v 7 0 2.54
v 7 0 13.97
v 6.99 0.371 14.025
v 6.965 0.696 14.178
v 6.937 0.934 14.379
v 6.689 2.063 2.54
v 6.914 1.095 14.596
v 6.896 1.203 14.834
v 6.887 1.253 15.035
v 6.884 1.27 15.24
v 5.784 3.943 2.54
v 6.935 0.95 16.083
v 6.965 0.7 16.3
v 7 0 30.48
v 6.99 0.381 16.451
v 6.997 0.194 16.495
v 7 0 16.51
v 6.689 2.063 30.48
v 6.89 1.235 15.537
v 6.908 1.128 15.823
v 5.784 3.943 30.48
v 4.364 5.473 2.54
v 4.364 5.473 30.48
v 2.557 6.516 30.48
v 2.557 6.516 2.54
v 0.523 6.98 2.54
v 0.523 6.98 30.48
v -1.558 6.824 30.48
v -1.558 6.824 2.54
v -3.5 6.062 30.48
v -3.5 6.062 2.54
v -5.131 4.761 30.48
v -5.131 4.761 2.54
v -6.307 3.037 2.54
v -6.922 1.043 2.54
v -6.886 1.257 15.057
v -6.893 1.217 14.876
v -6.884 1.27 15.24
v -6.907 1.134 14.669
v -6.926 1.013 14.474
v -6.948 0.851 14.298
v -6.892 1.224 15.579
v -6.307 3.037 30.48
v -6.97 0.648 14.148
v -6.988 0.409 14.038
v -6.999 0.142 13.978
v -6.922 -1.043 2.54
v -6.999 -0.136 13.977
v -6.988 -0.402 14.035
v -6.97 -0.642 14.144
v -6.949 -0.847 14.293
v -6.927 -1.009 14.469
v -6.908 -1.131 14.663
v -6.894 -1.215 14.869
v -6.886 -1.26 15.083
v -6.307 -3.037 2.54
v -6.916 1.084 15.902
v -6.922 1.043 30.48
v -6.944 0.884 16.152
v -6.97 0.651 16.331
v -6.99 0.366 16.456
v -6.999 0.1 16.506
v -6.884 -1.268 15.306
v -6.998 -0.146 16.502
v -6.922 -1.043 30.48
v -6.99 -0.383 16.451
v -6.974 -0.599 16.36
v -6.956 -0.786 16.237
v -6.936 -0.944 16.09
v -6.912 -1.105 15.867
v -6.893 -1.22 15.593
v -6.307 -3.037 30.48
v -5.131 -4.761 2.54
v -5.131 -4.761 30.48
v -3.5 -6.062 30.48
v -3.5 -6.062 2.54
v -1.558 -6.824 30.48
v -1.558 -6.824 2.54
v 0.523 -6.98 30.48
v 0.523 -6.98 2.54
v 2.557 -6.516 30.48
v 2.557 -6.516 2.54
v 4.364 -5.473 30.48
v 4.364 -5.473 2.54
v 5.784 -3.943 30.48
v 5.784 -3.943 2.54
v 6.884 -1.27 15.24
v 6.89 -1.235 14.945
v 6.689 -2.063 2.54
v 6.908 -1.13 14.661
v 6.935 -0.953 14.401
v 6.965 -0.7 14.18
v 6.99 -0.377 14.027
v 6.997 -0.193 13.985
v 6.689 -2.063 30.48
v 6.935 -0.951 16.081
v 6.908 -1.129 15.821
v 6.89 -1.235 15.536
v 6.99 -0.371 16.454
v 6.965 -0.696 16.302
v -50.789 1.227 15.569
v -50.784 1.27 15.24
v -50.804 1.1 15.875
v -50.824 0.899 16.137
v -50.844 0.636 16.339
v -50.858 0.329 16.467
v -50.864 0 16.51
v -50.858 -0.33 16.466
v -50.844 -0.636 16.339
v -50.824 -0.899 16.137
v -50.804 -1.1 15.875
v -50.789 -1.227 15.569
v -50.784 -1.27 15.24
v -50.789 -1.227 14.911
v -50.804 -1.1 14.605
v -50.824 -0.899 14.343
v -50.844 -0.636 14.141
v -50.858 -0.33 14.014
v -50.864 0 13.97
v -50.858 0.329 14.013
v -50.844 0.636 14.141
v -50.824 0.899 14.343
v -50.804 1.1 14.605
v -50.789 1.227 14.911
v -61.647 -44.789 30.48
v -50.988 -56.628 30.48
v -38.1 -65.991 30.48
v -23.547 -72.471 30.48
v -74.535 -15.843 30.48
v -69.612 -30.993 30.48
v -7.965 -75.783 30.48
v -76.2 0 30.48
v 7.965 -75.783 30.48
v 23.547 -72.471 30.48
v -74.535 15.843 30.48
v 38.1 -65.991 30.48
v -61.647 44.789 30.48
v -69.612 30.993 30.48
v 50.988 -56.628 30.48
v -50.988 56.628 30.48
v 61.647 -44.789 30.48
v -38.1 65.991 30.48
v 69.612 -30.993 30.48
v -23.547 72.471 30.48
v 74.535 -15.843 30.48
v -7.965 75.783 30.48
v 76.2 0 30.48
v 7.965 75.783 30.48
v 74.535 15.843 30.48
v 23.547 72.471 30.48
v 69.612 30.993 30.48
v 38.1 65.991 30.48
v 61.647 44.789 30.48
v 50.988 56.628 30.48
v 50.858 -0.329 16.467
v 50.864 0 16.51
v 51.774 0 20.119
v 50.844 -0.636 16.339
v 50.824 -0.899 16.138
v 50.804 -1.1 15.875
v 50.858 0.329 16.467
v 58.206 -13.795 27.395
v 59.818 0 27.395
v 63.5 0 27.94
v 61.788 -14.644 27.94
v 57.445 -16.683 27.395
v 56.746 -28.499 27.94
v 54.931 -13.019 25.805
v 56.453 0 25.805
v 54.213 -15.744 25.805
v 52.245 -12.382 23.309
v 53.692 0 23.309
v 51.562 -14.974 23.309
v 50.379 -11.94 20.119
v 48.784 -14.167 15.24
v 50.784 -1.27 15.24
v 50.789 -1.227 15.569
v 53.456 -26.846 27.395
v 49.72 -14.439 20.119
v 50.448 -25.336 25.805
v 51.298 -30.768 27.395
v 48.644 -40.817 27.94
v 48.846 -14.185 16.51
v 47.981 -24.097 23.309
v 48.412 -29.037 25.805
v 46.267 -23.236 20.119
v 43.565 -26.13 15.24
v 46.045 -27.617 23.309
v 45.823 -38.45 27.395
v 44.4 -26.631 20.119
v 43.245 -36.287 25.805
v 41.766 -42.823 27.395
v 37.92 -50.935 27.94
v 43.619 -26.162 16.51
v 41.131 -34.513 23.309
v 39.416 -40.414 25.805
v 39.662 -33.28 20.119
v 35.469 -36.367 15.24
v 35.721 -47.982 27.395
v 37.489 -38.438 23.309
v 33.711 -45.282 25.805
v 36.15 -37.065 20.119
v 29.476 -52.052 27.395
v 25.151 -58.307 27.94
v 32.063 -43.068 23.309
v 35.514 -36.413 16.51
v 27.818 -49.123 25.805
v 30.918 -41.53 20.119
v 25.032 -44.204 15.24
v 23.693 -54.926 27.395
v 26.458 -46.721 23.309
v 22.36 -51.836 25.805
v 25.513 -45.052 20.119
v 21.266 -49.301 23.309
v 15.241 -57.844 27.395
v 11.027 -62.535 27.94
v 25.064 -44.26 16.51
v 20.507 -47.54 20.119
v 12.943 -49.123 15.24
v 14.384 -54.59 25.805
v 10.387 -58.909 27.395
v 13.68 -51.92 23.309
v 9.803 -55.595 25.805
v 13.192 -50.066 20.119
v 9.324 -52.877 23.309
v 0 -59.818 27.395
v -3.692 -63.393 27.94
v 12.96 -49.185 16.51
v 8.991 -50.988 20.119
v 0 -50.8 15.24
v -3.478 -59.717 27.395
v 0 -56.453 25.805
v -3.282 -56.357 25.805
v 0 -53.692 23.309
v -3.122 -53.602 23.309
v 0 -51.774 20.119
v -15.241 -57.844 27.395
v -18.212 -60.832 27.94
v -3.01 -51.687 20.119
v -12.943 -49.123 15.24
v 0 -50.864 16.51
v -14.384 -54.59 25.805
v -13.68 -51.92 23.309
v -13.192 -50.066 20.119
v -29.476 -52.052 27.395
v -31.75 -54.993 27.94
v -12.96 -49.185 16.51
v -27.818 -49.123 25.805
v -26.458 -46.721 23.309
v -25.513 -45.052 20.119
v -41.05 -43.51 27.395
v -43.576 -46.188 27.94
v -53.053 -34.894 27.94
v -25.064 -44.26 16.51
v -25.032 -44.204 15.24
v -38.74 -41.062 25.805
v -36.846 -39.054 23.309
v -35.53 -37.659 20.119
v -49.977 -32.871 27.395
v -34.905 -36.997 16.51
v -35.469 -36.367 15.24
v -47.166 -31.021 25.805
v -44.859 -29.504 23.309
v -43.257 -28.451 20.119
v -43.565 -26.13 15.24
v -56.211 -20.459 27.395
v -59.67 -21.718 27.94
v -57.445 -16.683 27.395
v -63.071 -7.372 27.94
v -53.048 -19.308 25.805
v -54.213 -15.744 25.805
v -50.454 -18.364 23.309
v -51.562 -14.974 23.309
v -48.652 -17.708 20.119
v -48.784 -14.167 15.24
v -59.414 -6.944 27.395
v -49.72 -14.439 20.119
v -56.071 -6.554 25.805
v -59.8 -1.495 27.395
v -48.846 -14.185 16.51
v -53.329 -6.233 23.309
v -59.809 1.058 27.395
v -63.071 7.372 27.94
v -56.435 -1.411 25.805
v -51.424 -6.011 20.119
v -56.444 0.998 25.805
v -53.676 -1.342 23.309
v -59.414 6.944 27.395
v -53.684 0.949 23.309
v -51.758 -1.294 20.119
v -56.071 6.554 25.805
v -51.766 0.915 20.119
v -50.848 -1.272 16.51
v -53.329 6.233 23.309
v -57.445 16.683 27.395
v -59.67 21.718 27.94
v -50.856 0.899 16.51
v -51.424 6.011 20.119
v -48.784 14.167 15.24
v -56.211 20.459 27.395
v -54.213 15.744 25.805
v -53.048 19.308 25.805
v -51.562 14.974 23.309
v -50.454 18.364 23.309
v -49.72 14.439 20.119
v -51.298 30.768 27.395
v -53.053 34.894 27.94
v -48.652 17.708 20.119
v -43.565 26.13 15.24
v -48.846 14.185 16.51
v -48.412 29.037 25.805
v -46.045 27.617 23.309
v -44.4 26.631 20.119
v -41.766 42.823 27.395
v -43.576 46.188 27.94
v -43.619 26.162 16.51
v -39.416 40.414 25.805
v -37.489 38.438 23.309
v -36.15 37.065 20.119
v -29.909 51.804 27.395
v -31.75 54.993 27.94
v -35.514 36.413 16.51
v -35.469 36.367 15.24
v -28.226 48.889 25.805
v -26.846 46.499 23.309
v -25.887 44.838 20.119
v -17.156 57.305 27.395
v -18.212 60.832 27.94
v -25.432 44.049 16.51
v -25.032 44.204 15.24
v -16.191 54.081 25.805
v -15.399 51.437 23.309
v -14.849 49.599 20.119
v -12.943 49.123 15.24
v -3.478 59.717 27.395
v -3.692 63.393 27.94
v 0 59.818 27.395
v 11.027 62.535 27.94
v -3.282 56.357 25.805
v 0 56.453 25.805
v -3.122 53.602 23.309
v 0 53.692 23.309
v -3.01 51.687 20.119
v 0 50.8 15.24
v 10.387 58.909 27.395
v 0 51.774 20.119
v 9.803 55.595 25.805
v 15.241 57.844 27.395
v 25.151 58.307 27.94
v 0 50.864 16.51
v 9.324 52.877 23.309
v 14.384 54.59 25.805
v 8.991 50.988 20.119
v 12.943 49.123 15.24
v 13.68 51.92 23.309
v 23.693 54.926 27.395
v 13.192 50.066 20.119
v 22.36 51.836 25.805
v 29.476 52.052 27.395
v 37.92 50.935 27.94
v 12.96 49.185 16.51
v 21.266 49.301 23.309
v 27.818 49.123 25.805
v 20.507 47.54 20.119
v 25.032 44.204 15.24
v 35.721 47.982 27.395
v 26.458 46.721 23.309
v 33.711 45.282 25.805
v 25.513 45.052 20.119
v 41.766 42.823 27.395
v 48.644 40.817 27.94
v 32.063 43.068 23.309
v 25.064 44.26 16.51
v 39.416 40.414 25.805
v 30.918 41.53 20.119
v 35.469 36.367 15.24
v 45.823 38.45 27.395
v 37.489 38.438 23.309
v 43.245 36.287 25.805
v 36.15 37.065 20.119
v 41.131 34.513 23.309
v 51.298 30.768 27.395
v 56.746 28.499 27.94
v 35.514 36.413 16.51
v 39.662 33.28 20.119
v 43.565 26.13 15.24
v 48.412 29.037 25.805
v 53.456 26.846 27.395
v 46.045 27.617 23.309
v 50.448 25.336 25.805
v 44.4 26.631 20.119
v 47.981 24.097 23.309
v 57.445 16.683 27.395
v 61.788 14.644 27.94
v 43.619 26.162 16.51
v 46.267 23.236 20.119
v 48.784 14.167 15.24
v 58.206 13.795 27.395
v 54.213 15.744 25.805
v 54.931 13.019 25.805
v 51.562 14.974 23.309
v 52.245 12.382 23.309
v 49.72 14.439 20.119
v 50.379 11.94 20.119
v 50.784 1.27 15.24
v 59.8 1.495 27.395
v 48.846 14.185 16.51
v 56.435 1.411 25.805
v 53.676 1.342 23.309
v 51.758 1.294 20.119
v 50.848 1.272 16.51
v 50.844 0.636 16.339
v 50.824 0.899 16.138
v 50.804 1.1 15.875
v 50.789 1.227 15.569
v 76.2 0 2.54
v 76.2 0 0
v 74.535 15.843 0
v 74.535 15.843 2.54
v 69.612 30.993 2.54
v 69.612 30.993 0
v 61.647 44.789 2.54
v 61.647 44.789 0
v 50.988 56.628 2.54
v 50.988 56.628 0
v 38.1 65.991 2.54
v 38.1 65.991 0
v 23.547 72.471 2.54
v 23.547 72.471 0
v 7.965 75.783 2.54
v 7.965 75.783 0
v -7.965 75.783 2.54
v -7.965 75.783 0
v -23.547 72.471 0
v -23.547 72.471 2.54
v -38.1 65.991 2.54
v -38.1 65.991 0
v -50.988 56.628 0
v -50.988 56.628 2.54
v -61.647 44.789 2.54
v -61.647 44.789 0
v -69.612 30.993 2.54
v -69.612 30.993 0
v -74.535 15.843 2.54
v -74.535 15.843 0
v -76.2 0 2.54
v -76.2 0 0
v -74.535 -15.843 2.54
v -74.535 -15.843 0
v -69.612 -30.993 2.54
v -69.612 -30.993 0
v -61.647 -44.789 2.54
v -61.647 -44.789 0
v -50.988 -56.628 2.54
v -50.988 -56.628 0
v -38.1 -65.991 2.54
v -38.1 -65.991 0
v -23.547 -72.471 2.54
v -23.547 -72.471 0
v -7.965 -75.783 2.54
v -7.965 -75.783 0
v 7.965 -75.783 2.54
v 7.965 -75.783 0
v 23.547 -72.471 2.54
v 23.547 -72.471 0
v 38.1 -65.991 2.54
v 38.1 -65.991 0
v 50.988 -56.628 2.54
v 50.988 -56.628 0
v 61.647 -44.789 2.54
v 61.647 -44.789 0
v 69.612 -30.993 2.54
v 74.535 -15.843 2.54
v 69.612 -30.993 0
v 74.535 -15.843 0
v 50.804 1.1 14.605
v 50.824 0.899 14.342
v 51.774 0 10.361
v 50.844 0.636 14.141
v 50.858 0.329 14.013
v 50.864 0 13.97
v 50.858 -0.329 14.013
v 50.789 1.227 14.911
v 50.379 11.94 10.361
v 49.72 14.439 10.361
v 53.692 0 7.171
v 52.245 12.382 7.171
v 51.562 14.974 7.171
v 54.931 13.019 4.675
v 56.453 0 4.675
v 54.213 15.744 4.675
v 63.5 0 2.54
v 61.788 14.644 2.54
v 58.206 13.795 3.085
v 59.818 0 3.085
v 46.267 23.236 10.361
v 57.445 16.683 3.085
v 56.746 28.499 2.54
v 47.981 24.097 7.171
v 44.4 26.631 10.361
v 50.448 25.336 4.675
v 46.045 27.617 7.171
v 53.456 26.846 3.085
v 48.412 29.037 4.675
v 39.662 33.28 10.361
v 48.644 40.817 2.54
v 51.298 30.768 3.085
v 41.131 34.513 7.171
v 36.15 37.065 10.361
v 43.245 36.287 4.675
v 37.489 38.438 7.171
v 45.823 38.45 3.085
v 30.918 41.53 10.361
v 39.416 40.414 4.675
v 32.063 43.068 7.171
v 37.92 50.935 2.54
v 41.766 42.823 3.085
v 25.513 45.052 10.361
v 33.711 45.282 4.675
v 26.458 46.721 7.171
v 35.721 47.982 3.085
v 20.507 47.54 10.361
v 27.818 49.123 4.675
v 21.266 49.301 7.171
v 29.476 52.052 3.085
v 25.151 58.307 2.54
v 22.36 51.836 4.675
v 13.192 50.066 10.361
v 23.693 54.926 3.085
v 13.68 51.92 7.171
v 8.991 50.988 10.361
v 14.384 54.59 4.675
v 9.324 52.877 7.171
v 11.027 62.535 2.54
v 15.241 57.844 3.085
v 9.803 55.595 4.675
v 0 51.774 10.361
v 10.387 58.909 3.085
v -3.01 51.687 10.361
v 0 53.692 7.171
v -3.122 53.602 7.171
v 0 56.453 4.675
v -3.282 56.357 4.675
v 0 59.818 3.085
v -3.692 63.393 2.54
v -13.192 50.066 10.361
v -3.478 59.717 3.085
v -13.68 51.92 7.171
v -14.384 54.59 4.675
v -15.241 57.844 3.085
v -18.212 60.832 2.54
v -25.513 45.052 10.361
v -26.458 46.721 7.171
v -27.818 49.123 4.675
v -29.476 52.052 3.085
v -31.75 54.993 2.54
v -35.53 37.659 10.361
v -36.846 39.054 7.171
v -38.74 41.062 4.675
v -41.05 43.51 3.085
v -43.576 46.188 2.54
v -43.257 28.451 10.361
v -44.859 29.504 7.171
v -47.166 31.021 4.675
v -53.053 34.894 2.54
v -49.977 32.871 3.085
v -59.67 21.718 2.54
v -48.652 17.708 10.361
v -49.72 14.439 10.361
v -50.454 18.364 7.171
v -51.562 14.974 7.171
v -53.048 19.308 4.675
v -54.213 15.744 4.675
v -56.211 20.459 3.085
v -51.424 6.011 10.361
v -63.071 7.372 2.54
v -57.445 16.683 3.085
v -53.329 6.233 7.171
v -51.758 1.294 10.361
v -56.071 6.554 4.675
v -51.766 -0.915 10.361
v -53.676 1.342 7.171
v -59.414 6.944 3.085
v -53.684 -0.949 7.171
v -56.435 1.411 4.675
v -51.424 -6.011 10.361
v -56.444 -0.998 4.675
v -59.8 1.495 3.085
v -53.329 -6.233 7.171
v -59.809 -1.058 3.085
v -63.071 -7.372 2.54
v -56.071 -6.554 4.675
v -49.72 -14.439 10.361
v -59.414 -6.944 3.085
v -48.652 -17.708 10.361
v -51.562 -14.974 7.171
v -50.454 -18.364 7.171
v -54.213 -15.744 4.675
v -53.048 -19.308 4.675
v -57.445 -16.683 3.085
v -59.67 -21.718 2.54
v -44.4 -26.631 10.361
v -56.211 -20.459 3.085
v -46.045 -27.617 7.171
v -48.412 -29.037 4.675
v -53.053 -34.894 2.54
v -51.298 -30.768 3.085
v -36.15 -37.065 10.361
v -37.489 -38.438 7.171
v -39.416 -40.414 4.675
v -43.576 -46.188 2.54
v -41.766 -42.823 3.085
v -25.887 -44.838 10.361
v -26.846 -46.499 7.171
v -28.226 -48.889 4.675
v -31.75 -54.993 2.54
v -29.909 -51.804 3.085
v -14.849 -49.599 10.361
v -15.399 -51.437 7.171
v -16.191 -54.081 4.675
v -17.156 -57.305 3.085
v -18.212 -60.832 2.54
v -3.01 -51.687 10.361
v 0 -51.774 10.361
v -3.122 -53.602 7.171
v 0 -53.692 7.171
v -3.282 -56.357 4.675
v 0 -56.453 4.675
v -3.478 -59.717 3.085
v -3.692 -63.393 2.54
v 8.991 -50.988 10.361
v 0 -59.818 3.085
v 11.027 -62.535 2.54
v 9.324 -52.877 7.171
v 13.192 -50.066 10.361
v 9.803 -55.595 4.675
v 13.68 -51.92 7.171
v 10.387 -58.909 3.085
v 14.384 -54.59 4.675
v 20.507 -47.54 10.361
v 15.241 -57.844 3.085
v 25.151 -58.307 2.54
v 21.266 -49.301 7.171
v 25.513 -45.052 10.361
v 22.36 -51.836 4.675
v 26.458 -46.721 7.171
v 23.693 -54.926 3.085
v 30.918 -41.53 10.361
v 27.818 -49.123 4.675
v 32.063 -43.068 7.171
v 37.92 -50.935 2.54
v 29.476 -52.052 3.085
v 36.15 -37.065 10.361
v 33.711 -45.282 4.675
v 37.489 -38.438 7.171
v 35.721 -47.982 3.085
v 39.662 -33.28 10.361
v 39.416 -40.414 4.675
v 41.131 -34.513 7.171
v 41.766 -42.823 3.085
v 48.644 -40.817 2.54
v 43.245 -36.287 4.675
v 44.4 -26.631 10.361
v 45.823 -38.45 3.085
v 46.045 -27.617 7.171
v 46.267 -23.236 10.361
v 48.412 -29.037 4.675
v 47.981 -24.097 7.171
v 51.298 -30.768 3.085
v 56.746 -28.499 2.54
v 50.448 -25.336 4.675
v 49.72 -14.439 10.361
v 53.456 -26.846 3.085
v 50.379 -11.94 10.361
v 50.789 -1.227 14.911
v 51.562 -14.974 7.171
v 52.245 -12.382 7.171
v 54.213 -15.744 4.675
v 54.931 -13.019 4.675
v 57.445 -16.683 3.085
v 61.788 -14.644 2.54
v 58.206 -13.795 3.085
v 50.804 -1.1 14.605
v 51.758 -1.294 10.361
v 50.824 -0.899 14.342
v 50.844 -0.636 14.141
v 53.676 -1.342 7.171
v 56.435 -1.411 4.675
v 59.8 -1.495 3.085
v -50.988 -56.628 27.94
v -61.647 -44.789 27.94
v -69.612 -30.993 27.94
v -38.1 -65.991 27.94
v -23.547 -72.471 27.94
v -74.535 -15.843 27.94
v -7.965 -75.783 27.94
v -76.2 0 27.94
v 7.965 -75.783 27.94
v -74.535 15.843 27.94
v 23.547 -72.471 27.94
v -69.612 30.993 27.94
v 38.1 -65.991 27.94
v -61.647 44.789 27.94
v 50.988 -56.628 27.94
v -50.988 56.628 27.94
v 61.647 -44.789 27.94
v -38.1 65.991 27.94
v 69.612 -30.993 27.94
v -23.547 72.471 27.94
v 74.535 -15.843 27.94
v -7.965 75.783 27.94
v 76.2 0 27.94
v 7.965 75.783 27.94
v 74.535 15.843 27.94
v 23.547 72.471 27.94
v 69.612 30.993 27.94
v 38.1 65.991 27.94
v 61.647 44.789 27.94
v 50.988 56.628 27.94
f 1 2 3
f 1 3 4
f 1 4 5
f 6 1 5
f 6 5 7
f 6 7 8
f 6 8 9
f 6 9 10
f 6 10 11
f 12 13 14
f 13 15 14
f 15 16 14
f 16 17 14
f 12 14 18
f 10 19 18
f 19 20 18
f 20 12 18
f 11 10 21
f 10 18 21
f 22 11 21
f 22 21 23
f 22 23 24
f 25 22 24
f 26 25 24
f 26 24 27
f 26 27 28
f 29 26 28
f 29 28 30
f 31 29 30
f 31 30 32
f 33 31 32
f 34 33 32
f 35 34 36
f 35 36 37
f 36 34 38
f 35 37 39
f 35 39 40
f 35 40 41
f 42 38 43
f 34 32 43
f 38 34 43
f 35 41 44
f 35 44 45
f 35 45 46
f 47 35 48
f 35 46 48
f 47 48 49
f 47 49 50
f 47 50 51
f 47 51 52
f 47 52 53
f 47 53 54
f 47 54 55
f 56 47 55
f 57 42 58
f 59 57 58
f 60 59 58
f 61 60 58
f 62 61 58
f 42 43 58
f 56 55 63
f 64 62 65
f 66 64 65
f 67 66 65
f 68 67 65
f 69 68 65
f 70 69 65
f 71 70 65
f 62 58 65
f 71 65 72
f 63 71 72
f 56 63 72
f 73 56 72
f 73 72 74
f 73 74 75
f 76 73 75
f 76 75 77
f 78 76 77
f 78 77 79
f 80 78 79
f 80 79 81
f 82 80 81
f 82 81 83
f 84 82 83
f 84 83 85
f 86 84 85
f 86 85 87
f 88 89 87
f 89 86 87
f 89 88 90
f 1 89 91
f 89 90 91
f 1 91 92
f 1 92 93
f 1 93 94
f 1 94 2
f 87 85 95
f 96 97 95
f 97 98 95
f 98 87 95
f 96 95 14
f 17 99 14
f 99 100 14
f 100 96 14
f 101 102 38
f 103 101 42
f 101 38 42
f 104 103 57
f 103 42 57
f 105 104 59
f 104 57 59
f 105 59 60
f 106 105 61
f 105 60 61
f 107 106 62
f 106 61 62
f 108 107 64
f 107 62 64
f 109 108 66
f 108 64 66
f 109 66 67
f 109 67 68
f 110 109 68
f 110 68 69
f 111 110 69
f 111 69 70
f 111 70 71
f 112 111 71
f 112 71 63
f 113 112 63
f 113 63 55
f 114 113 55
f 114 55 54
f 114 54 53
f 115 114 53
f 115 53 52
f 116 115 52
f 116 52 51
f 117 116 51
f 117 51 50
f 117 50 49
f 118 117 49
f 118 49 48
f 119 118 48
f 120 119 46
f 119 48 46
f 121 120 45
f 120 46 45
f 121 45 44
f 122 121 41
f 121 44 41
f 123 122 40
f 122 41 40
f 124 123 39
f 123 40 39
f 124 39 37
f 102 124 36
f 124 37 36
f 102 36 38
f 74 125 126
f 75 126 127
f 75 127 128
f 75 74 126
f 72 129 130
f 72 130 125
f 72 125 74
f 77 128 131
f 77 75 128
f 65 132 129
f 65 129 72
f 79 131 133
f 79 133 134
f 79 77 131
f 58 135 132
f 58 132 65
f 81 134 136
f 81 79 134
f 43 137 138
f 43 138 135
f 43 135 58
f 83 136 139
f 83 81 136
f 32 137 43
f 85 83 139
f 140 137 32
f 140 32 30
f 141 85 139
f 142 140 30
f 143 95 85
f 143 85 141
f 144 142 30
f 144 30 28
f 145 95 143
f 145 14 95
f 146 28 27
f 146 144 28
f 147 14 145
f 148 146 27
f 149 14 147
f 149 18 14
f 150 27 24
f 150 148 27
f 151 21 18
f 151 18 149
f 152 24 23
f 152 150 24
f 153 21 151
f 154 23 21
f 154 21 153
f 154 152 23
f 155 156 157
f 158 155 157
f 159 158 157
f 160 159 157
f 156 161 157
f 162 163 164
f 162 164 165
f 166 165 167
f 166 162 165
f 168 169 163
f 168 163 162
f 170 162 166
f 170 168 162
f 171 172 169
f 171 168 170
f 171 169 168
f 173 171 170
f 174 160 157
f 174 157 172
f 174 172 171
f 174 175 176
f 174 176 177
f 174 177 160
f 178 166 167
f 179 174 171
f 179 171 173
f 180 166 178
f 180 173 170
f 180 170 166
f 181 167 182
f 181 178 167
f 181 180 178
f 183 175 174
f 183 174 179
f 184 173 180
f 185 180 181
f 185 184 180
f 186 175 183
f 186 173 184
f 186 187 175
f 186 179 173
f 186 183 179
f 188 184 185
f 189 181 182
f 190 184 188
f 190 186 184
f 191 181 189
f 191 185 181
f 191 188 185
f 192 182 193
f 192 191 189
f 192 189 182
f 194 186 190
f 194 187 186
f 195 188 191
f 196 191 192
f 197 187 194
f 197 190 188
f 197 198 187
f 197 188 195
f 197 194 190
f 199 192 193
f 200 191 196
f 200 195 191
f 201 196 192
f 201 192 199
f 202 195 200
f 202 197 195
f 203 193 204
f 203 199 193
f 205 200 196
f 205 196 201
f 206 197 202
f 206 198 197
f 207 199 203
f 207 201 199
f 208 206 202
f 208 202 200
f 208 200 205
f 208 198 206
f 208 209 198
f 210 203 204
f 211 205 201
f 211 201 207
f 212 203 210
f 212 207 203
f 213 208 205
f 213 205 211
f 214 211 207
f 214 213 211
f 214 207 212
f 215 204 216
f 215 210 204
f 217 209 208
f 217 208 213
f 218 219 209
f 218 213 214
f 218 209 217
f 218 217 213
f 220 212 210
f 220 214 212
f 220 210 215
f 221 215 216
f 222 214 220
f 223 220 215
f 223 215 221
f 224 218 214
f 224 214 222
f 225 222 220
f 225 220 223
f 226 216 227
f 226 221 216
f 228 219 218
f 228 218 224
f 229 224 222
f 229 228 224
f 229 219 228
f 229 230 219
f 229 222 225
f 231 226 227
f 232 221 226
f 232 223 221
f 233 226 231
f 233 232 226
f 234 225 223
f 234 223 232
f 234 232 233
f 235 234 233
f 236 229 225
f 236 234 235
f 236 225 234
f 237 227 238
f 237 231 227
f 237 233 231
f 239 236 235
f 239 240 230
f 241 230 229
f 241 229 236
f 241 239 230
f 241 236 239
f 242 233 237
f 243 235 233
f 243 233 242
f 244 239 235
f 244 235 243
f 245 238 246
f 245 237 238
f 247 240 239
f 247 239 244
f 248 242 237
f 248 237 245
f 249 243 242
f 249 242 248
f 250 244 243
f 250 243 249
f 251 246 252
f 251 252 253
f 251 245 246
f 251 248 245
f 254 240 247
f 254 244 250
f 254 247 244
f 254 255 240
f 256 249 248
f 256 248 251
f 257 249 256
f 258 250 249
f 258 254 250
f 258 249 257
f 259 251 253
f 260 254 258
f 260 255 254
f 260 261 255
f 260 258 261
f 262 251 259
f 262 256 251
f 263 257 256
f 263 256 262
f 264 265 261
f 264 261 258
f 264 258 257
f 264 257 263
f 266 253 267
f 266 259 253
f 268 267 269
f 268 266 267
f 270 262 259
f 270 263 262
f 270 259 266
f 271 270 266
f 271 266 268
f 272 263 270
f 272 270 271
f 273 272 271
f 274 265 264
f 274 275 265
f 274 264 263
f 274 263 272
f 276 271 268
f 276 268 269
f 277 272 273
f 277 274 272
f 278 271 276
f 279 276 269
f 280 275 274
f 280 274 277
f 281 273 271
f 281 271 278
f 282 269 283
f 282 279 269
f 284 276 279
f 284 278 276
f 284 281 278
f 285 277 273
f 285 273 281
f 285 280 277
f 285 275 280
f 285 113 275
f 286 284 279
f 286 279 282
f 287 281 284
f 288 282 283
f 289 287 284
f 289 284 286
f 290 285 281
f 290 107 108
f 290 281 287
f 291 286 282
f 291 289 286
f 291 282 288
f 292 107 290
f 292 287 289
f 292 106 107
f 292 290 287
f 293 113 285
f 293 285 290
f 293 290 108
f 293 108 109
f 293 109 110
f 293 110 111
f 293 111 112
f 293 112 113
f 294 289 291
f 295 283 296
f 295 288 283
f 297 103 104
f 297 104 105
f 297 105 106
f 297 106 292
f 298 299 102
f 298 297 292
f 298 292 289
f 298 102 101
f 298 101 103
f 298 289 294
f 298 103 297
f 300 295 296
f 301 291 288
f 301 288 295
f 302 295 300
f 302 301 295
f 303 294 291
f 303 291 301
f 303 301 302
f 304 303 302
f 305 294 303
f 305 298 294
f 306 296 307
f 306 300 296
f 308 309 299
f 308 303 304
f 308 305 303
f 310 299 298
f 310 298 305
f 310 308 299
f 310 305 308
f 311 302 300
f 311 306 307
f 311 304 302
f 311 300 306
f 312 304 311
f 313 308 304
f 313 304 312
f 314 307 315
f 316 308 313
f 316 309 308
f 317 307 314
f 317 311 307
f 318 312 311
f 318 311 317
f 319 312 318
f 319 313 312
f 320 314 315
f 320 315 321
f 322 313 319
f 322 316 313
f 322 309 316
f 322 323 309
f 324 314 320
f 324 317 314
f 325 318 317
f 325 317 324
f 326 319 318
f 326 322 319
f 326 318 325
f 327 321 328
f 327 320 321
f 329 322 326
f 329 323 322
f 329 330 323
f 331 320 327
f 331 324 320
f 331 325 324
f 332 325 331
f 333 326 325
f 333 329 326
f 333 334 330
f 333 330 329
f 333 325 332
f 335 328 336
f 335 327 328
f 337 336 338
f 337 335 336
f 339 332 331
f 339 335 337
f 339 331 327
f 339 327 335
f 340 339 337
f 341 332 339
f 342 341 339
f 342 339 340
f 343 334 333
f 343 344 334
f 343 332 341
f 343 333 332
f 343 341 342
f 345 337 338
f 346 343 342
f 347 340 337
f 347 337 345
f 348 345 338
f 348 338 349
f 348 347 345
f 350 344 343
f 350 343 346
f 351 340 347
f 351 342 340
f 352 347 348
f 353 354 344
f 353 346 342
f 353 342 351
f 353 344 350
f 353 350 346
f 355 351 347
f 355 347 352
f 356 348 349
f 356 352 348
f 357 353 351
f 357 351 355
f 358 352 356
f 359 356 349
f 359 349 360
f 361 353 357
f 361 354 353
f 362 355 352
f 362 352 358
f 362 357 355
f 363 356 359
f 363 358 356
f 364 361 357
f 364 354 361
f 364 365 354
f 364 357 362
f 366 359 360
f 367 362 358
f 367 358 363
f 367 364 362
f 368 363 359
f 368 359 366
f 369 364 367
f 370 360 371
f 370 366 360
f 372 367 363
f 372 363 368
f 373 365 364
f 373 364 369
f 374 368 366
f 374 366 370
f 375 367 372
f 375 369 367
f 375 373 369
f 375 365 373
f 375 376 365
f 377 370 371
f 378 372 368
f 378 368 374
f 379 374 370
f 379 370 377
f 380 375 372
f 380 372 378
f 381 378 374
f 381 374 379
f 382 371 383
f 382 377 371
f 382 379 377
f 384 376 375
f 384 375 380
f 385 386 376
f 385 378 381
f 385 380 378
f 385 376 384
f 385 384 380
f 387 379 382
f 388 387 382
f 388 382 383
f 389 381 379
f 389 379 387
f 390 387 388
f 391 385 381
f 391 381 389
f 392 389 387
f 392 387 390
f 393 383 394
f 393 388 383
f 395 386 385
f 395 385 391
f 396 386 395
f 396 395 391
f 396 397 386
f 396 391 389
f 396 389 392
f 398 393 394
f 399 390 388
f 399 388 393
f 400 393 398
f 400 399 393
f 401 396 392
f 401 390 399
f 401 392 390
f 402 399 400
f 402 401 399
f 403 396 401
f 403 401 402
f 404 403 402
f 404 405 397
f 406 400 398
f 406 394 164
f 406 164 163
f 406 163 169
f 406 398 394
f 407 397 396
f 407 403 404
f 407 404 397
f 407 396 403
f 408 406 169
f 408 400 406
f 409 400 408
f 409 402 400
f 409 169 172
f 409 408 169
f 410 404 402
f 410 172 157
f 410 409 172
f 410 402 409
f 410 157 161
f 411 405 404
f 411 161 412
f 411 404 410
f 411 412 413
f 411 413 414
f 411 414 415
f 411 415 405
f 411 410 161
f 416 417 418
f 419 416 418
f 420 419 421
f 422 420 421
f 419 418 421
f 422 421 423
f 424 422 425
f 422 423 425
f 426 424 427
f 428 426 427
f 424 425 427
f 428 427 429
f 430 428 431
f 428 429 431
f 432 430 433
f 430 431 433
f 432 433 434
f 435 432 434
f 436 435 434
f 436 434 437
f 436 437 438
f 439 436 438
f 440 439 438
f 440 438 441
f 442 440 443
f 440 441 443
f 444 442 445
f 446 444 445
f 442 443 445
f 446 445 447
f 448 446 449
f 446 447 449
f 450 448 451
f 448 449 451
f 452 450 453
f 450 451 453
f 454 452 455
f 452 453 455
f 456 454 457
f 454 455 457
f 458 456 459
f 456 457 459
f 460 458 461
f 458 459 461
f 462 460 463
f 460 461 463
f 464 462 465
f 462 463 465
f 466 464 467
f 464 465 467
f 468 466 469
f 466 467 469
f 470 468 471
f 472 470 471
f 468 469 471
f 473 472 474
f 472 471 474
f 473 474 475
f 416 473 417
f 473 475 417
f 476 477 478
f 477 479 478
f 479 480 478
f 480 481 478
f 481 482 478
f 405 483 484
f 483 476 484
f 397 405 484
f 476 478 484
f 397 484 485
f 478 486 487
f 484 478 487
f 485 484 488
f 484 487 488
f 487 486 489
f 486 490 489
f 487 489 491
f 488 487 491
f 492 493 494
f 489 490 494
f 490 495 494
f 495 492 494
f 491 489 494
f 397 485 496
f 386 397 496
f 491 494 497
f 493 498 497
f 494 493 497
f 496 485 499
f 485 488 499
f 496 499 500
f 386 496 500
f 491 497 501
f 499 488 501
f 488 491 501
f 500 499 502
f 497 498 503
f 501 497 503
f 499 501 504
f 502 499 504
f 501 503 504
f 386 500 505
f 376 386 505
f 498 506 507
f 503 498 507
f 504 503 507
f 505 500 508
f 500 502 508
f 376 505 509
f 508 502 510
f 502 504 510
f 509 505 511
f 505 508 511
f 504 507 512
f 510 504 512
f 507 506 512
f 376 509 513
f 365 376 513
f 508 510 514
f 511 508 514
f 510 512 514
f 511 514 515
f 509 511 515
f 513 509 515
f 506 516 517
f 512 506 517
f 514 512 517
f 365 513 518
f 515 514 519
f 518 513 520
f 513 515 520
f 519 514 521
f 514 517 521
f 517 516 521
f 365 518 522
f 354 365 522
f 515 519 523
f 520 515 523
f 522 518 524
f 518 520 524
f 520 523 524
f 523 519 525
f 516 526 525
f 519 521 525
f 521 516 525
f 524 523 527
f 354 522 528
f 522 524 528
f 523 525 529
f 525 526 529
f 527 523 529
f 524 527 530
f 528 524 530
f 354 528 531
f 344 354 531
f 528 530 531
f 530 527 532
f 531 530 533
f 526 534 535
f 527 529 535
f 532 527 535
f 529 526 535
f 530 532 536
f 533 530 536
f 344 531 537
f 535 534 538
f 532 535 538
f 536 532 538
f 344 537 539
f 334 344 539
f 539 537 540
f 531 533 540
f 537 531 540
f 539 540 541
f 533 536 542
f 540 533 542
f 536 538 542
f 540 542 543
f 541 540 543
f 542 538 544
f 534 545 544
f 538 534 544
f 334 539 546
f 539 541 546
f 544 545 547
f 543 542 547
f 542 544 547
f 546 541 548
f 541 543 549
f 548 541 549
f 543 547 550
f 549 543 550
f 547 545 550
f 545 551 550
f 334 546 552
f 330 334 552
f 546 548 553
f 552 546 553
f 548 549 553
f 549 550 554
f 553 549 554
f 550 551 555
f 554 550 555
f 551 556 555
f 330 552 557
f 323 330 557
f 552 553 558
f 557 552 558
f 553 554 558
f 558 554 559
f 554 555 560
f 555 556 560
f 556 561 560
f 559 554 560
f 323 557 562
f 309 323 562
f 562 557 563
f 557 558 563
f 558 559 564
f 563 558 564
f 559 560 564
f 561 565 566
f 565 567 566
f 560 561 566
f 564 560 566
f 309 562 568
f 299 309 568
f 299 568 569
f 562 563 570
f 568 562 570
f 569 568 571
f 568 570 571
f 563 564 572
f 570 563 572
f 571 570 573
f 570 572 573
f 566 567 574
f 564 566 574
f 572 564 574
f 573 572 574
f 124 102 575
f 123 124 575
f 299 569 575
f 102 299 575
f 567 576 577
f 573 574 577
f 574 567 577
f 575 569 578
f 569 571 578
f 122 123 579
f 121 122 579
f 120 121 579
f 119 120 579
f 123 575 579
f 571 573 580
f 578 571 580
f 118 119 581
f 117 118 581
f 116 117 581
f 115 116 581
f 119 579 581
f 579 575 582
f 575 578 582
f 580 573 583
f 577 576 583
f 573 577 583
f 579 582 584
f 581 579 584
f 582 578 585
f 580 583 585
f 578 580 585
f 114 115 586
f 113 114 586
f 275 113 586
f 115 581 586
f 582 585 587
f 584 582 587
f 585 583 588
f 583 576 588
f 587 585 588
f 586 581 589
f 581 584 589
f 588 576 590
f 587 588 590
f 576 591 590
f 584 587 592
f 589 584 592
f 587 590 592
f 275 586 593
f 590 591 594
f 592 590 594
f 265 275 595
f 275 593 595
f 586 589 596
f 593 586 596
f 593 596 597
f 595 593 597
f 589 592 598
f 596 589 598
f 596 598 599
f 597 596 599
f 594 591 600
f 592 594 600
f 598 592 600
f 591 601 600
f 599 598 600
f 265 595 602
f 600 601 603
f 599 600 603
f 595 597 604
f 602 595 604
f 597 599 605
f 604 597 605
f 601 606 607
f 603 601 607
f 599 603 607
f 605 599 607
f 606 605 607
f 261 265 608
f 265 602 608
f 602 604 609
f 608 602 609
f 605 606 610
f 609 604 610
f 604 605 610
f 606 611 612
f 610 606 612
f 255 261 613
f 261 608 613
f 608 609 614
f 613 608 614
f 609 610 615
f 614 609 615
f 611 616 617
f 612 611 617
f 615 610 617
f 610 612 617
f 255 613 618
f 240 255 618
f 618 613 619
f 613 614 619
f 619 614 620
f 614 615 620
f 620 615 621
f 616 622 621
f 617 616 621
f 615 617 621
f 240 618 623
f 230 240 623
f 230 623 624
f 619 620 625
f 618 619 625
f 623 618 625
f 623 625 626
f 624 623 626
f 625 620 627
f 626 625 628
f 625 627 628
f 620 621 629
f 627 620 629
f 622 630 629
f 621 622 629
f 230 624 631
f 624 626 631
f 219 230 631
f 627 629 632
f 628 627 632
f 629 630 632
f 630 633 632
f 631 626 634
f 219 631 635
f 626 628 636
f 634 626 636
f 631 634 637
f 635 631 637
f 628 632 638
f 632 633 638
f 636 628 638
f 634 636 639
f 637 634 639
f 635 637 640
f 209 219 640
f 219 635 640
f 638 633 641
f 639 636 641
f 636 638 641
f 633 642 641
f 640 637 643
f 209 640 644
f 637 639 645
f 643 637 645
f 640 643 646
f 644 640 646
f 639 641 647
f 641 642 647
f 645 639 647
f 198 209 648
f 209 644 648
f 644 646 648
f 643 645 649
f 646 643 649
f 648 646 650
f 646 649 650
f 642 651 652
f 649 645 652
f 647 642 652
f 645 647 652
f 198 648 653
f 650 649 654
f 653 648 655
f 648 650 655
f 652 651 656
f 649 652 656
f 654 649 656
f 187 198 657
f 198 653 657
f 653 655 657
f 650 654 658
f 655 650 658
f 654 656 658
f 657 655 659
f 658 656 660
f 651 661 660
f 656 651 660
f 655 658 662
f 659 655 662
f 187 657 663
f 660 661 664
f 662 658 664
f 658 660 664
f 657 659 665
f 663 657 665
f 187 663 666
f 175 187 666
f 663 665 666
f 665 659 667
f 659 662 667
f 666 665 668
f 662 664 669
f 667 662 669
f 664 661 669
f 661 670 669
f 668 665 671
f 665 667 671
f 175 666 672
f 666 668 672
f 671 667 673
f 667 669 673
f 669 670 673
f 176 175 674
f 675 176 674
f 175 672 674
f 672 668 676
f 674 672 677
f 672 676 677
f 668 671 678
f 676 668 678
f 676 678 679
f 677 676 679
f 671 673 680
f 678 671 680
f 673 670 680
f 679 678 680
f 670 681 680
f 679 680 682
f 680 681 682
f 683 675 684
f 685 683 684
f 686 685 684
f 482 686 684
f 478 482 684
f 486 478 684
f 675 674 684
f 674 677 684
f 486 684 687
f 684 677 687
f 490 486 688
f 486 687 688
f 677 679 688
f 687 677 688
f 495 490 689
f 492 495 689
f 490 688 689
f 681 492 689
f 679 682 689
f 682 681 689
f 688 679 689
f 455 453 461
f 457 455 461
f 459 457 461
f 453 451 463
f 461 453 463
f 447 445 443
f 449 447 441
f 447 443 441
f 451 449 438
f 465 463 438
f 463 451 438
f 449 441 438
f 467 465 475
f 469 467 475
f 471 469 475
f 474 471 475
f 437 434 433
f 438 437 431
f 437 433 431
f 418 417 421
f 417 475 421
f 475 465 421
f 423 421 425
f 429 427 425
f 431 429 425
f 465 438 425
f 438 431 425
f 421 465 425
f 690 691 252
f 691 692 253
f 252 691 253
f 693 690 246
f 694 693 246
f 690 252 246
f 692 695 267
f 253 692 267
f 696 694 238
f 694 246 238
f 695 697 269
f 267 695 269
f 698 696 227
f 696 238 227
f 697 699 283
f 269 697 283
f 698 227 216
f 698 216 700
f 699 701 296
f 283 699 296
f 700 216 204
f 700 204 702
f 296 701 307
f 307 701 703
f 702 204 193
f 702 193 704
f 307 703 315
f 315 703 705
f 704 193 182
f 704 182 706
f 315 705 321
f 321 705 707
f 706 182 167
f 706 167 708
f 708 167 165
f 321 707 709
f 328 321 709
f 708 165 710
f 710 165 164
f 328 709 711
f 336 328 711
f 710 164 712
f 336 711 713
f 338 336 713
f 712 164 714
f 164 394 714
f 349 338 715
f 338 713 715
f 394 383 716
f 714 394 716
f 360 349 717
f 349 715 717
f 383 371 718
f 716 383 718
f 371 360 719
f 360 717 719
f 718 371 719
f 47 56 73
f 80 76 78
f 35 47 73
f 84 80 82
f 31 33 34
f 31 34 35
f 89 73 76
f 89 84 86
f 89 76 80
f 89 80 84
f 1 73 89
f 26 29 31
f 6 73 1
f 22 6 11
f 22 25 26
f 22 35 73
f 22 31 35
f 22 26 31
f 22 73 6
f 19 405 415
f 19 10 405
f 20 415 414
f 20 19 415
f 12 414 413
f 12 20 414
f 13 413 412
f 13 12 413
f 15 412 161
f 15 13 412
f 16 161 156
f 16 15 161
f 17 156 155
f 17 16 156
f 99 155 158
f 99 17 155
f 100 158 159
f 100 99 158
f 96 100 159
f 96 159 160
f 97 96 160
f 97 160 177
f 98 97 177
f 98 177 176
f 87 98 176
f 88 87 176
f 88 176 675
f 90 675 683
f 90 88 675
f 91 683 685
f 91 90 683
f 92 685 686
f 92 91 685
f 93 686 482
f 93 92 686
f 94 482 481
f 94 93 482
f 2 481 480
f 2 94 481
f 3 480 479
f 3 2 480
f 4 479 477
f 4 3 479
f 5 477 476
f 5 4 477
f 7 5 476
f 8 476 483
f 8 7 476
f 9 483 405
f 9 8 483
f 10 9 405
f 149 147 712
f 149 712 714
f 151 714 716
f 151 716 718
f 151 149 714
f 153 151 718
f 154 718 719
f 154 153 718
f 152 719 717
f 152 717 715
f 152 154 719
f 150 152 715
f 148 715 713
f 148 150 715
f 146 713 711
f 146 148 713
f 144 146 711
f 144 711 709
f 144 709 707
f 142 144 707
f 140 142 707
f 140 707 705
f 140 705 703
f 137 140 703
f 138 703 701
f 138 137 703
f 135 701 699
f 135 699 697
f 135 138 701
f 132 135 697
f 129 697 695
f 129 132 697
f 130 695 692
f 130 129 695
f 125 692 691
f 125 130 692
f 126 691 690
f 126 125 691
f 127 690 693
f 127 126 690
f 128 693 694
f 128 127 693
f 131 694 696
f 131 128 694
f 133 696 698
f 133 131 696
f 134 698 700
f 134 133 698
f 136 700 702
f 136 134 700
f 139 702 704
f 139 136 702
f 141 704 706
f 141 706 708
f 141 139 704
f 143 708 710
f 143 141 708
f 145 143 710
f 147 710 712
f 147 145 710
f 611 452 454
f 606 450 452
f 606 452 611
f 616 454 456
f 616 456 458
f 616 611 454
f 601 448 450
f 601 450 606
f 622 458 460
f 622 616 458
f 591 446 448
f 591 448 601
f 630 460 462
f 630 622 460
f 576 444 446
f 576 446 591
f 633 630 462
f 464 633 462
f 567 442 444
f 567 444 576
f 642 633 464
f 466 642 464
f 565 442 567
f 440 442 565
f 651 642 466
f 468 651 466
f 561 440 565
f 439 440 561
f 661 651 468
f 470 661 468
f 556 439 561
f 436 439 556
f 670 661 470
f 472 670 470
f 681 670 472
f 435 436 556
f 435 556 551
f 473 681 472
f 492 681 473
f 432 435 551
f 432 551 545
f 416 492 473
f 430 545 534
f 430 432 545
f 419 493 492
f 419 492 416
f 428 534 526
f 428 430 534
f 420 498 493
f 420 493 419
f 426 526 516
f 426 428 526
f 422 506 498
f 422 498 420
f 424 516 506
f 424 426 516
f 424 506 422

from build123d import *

# Parameters (mm, degrees)
F0_R      = 50.8
F1_DEPTH  = 30.48
F0_R_2    = 76.2
F2_DEPTH  = 2.54
F3_R      = 76.2
F4_DEPTH  = 2.54
F5_R      = 12.69999
F6_R      = 1.27
F7_DEPTH  = 254
F8_DEPTH  = 254
F9_R      = 6.9999987
F10_DEPTH = 27.94


# Not quite as in the source:
# - a fillet or chamfer is up to 0.001 mm smaller than in the source, because OpenCascade refuses the exact size


with BuildPart() as f1:
    # F0 (on Top) → F1 (new body)
    with BuildSketch(Plane.XY):
        Circle(F0_R)
    extrude(amount=F1_DEPTH)

    # F0 (on Top) → F2 (join)
    with BuildSketch(Plane.XY):
        Circle(F0_R_2)
        Circle(F0_R, mode=Mode.SUBTRACT)
    extrude(amount=F2_DEPTH)

    # F3 (on face) → F4 (join)
    with BuildSketch(Plane.XY.offset(30.48)):
        Circle(F3_R)
    extrude(amount=-F4_DEPTH)

    # F5 (radius 12.7 in the source; OpenCascade refuses exactly that, so slightly less here)
    f5_edges = [f1.edges().sort_by_distance(p)[0] for p in [
        (50.8, 0, 15.24),
        (-50.8, 0, 27.94),
        (-50.8, 0, 2.54),
    ]]
    fillet(f5_edges, radius=F5_R)

    # F6 (on Right) → F7 (cut)
    with BuildSketch(Plane.YZ):
        with Locations((0, 15.24)):
            Circle(F6_R)
    extrude(amount=-F7_DEPTH, mode=Mode.SUBTRACT)

    # F6 (on Right) → F8 (cut)
    with BuildSketch(Plane.YZ):
        with Locations((0, 15.24)):
            Circle(F6_R)
    extrude(amount=F8_DEPTH, mode=Mode.SUBTRACT)

    # F9 (on face) → F10 (cut)
    with BuildSketch(Plane.XY.offset(30.48)):
        Circle(F9_R)
    extrude(amount=-F10_DEPTH, mode=Mode.SUBTRACT)


solid = f1.part
